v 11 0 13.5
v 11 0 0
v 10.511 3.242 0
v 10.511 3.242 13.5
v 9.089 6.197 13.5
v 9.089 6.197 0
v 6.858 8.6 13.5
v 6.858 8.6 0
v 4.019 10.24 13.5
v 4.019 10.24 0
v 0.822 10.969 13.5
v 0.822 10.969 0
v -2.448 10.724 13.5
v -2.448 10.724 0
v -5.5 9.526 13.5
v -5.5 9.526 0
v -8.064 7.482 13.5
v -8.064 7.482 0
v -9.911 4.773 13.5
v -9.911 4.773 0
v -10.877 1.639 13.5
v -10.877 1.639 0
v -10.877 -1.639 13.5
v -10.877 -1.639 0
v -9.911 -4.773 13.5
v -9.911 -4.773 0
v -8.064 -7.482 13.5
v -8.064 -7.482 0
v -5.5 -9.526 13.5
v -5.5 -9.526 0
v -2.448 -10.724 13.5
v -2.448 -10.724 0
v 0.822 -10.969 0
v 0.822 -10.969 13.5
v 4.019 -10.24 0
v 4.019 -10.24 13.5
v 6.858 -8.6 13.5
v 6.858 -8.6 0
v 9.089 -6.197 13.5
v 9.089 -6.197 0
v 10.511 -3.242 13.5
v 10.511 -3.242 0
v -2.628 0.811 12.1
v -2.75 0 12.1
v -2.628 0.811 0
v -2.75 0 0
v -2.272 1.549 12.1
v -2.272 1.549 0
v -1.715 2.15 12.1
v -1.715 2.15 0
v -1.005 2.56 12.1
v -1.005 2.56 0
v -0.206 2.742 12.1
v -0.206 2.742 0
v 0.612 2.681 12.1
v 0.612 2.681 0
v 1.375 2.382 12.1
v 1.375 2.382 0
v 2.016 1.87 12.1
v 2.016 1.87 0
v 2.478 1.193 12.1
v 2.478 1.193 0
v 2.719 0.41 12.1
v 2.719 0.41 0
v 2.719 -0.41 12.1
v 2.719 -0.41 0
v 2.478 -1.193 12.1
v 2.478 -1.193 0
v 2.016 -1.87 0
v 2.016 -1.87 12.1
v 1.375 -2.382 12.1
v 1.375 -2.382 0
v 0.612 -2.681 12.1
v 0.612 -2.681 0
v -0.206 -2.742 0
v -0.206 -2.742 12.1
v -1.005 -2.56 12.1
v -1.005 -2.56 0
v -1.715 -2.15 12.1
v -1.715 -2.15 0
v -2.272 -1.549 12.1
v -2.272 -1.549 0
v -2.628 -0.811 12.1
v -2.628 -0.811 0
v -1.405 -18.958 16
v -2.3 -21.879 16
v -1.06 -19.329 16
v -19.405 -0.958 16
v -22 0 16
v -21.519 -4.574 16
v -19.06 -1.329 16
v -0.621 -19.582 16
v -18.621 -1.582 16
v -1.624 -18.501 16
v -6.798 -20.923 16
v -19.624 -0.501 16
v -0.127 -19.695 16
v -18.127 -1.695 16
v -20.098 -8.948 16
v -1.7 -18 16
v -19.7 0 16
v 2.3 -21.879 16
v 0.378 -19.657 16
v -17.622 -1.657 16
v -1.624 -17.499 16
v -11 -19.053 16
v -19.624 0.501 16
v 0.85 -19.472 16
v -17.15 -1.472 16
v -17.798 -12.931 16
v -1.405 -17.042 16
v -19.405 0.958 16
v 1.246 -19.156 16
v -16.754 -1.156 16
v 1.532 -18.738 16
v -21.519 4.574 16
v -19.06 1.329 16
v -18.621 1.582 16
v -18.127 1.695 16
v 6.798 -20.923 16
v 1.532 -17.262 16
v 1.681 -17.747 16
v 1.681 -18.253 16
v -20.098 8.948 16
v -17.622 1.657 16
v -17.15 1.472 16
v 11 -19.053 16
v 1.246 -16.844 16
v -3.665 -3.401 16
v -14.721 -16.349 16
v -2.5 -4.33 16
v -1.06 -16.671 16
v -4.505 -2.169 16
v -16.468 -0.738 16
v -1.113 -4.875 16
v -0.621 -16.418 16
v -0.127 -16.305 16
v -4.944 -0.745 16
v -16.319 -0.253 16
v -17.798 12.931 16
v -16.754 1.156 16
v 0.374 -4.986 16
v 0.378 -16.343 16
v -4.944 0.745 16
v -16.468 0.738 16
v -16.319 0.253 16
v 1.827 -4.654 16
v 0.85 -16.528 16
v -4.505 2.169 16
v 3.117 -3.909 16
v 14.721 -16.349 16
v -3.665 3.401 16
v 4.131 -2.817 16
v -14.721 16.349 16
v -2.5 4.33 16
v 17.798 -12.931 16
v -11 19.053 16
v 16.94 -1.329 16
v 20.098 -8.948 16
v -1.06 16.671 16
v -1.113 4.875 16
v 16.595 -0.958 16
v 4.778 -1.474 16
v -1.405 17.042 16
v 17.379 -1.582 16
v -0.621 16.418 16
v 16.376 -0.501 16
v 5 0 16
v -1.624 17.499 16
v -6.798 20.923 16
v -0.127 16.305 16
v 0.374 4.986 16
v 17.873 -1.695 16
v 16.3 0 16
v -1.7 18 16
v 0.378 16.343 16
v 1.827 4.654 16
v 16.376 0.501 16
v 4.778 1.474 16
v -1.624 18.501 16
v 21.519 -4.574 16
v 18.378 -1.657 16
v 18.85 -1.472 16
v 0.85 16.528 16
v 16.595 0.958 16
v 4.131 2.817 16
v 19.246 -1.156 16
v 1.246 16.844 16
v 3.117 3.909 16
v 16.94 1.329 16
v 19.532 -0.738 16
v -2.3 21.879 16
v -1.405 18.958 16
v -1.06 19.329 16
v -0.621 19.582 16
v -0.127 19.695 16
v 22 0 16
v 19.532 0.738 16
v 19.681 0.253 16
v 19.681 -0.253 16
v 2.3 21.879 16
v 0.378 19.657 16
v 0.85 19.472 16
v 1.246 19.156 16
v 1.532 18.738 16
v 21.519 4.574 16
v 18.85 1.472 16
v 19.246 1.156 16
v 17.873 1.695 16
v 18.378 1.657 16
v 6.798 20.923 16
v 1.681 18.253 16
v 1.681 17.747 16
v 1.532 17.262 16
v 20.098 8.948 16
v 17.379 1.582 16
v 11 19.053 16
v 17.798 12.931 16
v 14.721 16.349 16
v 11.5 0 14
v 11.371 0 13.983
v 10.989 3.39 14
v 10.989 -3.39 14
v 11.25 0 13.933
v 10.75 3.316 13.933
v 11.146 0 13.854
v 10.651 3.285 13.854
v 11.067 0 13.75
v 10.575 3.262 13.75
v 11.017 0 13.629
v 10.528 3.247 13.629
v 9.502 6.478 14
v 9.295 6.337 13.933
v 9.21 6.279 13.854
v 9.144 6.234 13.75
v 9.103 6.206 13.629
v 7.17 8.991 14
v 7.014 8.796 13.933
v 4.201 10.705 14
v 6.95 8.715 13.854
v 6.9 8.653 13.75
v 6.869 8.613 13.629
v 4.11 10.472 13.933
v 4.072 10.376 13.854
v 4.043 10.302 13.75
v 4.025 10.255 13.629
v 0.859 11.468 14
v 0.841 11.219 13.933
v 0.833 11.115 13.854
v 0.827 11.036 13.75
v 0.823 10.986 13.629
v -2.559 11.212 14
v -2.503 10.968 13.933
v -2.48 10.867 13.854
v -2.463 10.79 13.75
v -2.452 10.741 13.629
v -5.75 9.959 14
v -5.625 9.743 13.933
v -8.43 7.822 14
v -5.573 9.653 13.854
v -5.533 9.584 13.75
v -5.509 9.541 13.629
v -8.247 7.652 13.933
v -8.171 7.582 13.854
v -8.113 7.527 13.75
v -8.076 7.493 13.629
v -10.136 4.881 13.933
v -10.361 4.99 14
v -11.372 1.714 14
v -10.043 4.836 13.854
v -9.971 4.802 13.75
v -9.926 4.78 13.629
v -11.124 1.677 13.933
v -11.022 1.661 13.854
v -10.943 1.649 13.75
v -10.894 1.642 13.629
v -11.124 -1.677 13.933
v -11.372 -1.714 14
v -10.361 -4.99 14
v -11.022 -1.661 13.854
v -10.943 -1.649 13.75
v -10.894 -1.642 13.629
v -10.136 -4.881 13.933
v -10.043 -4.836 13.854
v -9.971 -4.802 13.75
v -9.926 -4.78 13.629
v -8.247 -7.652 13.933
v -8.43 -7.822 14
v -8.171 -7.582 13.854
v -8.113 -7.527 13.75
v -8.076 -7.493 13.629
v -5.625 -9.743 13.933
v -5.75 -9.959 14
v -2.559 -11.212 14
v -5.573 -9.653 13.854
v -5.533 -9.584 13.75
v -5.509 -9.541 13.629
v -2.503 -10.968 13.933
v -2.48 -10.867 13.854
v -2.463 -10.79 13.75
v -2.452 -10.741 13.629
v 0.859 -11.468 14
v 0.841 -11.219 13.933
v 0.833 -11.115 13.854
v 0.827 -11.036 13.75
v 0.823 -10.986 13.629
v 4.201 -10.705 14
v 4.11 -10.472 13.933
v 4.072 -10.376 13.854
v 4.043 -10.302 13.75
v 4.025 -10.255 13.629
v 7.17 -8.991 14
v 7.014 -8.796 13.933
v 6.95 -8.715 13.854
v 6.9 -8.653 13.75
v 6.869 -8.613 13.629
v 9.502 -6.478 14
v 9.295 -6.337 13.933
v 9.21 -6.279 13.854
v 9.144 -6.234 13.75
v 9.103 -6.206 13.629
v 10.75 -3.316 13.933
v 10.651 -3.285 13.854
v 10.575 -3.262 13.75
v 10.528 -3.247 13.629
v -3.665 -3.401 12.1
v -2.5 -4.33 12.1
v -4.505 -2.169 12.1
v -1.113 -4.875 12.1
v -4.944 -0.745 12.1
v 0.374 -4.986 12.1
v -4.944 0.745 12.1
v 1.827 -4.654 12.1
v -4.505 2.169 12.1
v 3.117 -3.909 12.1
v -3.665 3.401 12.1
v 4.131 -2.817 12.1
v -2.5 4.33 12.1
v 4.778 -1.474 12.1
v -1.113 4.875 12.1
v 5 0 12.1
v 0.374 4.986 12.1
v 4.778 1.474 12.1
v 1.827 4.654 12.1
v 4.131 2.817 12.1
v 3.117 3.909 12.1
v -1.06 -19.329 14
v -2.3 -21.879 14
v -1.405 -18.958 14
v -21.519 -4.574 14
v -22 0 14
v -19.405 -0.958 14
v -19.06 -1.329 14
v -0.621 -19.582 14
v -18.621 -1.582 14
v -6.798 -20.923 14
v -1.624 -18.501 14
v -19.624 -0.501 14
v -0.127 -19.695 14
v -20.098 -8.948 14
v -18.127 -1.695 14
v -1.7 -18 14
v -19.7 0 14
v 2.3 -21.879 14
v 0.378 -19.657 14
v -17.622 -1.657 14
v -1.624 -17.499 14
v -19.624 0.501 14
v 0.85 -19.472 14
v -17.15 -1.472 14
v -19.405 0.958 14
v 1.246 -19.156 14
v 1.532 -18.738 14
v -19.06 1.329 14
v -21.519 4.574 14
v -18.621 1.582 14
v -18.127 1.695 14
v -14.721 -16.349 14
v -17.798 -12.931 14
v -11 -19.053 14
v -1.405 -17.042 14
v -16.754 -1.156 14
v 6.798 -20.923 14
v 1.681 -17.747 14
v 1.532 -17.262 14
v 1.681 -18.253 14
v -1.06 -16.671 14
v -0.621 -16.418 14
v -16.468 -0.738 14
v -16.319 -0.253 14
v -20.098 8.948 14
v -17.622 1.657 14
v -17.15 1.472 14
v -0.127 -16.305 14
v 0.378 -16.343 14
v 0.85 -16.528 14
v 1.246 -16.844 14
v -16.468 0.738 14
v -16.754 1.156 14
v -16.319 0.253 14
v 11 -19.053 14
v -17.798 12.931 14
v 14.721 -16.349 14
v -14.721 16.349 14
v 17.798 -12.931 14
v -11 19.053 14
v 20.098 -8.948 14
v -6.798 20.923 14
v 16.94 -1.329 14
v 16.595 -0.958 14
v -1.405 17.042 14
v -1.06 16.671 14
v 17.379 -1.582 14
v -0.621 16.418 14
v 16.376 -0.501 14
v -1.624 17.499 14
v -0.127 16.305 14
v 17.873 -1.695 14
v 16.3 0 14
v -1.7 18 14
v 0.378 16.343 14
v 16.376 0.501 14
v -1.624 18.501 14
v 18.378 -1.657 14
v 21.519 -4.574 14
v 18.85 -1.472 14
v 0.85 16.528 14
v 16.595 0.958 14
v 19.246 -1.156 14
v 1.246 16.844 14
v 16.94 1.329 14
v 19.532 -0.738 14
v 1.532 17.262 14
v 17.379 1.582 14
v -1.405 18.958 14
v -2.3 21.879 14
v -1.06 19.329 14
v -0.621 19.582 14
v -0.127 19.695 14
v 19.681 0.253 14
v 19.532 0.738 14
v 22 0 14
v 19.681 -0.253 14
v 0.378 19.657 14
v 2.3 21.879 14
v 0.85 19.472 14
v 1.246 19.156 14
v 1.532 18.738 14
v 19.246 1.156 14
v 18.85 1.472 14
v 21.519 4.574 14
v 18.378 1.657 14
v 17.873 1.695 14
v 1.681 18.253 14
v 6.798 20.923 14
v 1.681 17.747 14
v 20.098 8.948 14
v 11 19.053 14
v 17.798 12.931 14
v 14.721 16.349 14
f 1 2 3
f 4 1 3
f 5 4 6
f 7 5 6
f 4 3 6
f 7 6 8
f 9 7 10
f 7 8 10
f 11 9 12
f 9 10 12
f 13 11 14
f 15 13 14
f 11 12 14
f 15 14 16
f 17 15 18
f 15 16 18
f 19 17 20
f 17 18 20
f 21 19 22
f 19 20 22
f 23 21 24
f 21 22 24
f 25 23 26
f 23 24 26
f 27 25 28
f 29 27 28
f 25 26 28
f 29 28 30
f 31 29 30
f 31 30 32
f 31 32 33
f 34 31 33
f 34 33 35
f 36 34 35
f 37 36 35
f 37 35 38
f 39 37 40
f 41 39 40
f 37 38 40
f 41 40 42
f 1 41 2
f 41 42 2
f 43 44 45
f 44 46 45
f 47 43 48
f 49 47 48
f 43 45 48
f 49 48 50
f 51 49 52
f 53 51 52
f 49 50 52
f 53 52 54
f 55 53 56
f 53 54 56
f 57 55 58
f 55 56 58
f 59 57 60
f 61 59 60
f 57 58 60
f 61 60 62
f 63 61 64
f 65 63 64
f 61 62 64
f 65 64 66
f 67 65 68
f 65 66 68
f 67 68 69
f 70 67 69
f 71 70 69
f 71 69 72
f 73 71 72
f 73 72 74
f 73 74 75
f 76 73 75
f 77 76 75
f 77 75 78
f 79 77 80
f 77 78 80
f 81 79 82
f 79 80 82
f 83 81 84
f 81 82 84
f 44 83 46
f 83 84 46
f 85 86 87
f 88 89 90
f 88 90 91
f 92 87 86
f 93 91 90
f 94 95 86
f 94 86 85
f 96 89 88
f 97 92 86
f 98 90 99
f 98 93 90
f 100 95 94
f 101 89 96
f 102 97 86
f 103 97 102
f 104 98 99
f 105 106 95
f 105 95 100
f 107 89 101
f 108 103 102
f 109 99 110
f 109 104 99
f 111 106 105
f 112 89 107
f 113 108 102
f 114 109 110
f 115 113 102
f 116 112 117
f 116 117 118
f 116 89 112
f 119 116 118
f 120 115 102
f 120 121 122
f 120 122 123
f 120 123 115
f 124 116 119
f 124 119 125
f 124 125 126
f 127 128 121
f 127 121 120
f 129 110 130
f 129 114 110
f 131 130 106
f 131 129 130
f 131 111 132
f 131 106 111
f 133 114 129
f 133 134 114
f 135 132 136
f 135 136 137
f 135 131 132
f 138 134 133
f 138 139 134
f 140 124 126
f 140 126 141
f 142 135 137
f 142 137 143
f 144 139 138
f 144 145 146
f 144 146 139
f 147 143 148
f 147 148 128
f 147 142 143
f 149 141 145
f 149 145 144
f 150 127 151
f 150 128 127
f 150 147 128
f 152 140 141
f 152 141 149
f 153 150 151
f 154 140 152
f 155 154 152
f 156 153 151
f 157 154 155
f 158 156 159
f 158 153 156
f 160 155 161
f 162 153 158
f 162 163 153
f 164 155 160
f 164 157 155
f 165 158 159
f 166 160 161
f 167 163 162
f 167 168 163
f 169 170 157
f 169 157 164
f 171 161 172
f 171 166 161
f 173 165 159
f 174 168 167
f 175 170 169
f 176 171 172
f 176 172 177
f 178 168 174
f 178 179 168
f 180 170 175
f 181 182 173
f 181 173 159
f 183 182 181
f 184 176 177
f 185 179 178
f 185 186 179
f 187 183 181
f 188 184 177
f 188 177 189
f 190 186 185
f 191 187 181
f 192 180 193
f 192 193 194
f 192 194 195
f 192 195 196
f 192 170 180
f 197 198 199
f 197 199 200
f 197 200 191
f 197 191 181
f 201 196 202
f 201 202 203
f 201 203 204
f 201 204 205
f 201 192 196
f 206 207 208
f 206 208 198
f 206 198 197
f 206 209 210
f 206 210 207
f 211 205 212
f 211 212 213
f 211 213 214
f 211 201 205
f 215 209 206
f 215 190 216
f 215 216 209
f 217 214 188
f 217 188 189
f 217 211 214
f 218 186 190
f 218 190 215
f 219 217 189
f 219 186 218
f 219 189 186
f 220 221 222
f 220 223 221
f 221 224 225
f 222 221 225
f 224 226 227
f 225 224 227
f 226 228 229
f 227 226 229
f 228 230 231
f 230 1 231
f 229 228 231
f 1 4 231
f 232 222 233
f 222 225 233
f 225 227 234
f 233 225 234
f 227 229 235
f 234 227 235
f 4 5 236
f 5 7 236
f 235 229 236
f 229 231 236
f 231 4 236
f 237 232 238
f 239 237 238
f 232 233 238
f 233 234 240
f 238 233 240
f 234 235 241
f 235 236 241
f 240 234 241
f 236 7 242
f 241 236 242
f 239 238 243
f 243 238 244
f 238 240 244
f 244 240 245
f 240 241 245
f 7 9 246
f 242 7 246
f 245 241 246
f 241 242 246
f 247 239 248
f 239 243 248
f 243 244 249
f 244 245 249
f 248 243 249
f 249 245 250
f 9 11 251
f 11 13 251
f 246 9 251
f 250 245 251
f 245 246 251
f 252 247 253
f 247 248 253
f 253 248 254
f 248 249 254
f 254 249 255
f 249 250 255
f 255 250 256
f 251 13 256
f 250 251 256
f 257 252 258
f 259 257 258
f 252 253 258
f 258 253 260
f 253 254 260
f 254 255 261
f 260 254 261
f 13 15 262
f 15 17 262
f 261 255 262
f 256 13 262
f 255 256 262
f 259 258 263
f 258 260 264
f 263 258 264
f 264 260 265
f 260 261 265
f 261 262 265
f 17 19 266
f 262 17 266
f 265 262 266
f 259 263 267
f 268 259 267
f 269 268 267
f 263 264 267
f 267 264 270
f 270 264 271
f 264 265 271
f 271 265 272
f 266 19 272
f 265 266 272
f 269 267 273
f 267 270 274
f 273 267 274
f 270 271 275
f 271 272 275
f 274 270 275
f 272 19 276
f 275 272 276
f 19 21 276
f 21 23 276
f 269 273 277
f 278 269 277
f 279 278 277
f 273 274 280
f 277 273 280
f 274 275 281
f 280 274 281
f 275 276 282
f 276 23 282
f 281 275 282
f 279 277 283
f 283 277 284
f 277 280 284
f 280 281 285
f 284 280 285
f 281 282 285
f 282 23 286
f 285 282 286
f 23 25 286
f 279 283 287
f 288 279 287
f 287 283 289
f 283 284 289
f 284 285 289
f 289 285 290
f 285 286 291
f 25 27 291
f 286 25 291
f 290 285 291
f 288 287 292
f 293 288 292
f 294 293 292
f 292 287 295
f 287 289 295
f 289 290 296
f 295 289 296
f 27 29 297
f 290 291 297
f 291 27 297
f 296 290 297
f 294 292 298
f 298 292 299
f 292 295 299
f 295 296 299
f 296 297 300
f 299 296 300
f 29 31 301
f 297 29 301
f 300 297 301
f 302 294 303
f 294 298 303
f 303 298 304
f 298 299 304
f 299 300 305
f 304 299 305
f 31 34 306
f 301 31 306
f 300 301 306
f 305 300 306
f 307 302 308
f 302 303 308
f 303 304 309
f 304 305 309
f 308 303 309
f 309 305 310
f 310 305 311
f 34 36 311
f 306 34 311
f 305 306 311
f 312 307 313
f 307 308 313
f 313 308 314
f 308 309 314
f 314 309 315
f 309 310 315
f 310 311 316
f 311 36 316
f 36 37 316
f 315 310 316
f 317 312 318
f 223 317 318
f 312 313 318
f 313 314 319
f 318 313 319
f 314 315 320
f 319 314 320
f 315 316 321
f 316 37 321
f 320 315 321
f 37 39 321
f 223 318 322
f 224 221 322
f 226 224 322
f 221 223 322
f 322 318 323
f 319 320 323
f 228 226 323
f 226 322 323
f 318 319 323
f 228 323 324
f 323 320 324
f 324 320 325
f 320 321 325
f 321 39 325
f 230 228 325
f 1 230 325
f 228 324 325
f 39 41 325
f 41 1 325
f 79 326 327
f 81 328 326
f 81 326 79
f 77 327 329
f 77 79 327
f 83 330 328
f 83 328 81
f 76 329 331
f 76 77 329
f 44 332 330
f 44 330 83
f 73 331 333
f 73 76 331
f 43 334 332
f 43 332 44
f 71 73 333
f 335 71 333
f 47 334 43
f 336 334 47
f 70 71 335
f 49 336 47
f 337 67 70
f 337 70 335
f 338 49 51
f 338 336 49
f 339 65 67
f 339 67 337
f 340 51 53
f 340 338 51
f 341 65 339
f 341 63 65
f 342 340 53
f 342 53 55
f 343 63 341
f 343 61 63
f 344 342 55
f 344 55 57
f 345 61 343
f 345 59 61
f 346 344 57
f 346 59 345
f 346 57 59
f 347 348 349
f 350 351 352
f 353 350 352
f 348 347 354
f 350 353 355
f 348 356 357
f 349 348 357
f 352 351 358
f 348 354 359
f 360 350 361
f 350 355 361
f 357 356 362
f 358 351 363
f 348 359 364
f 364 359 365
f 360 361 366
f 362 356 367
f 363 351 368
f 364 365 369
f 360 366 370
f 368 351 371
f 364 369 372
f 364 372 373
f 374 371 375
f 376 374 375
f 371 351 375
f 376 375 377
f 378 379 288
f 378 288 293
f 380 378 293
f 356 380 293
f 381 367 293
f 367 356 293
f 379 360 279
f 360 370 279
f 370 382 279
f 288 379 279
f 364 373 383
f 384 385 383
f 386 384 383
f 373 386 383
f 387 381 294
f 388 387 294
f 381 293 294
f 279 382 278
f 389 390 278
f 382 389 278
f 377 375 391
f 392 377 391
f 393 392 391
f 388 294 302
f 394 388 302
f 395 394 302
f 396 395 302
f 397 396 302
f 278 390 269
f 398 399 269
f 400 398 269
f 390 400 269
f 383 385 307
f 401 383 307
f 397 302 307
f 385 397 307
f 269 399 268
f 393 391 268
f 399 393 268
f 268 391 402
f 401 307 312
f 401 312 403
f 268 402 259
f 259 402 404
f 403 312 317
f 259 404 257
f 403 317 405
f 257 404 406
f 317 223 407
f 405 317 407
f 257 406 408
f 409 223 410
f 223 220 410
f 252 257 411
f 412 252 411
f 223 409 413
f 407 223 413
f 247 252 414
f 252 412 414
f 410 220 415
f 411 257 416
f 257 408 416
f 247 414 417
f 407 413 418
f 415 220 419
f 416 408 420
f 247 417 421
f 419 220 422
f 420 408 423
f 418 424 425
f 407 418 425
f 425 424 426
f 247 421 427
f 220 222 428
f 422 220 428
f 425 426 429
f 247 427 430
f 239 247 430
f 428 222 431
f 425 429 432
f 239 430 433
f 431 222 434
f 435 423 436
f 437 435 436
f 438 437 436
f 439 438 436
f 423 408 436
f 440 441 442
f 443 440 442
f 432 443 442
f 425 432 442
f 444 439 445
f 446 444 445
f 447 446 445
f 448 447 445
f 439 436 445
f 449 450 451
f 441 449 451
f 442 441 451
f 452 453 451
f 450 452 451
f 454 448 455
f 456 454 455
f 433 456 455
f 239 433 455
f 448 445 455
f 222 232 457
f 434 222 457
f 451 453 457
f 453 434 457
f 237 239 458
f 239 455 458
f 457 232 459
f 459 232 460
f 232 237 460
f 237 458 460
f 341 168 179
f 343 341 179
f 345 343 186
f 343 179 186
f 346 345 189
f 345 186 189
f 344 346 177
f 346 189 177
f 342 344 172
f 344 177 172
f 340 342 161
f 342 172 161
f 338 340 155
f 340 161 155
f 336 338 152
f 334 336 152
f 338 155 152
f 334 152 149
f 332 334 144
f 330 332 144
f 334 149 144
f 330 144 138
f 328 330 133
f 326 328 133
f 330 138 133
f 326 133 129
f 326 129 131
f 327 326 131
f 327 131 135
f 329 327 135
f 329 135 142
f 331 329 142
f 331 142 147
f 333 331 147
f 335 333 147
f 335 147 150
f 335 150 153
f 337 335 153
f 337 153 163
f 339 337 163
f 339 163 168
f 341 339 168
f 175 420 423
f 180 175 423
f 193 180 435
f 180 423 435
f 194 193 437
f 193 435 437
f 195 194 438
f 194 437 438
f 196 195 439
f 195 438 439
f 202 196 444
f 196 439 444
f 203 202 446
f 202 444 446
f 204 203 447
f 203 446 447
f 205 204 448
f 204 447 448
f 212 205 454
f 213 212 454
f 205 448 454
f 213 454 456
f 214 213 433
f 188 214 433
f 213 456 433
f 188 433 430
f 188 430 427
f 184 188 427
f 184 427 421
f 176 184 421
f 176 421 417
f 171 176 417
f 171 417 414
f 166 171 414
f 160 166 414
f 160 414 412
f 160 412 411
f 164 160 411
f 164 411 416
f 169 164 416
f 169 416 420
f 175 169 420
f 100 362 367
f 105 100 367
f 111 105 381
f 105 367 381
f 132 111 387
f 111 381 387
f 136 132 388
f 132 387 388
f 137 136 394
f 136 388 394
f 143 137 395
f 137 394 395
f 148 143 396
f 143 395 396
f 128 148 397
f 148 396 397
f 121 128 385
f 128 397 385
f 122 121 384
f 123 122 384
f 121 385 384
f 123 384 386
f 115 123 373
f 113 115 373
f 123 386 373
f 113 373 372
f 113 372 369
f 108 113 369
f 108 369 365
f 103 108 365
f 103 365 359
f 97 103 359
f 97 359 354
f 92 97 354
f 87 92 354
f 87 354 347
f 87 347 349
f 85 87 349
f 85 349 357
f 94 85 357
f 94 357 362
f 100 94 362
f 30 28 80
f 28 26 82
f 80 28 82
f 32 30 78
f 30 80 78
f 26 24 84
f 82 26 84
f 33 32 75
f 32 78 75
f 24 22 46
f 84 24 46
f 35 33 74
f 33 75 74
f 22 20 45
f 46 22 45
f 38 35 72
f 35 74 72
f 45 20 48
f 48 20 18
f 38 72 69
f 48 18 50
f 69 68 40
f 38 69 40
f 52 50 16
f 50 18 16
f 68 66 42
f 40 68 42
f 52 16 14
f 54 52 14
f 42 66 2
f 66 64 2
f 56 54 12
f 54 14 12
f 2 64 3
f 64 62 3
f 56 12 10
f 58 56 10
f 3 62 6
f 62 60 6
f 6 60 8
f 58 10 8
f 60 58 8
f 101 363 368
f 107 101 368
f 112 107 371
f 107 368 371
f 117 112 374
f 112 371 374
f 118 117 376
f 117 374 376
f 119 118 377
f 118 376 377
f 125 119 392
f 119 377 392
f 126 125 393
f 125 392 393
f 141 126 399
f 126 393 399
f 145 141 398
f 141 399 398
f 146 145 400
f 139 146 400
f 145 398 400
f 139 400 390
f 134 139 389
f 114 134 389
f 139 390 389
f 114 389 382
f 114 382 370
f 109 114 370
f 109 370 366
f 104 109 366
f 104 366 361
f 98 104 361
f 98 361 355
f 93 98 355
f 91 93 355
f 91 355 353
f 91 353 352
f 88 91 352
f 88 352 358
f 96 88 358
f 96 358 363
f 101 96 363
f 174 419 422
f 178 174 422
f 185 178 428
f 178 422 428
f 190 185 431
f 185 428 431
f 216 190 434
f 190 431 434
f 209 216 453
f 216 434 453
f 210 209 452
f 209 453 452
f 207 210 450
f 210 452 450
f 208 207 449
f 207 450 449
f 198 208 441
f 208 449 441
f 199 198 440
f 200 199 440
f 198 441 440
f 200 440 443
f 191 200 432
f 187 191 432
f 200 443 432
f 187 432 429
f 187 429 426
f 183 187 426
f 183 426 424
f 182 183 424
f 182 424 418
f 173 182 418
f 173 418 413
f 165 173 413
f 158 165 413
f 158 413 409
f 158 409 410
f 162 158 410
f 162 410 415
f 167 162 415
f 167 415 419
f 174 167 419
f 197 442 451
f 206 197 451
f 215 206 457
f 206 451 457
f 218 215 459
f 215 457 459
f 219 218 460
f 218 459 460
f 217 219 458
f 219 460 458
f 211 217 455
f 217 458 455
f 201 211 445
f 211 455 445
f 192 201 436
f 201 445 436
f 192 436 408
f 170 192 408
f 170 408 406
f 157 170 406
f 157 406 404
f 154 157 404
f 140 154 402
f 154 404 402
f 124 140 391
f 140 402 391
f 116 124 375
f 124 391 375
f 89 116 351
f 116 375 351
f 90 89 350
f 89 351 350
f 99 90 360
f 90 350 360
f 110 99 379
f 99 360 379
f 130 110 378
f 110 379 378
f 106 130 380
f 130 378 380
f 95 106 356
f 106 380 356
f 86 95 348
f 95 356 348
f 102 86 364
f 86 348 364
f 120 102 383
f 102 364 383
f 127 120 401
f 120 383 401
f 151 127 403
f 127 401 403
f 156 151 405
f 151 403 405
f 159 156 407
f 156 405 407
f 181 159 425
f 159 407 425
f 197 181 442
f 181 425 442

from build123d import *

# Parameters (mm, degrees)
SKETCH1_R                                            = 11
BOSS_EXTRUDE1_DEPTH                                  = 14
SKETCH2_R                                            = 22
BOSS_EXTRUDE2_DEPTH                                  = 2
M3_CLEARANCE_HOLE1_D                                 = 3.4
CBORE_FOR_M5_HEX_SOCKET_THIN_HEAD_CAP_SC_D           = 5.5
CBORE_FOR_M5_HEX_SOCKET_THIN_HEAD_CAP_SC_CBORE_D     = 10
CBORE_FOR_M5_HEX_SOCKET_THIN_HEAD_CAP_SC_CBORE_DEPTH = 3.9
FILLET1_R                                            = 0.5


with BuildPart() as part:
    # Sketch1 → Boss-Extrude1 (new body)
    with BuildSketch(Plane.XY):
        Circle(SKETCH1_R)
    extrude(amount=BOSS_EXTRUDE1_DEPTH)

    # Sketch2 → Boss-Extrude2 (add)
    with BuildSketch(Plane.XY.offset(14)):
        Circle(SKETCH2_R)
    extrude(amount=BOSS_EXTRUDE2_DEPTH)

    # M3 Clearance Hole1 (through all)
    with Locations(Plane.XY.offset(16)):
        with Locations((-18, 0), (0, 18), (18, 0), (0, -18)):
            Hole(M3_CLEARANCE_HOLE1_D / 2)

    # CBORE for M5 Hex Socket Thin Head Cap Screw1 (through all)
    with Locations(Plane.XY.offset(16)):
        with Locations((0, 0)):
            CounterBoreHole(CBORE_FOR_M5_HEX_SOCKET_THIN_HEAD_CAP_SC_D / 2, CBORE_FOR_M5_HEX_SOCKET_THIN_HEAD_CAP_SC_CBORE_D / 2, CBORE_FOR_M5_HEX_SOCKET_THIN_HEAD_CAP_SC_CBORE_DEPTH)

    # Fillet1
    fillet1_edges = [part.edges().sort_by_distance(p)[0] for p in [
        (-11, 0, 14),
    ]]
    fillet(fillet1_edges, radius=FILLET1_R)


solid = part.part
